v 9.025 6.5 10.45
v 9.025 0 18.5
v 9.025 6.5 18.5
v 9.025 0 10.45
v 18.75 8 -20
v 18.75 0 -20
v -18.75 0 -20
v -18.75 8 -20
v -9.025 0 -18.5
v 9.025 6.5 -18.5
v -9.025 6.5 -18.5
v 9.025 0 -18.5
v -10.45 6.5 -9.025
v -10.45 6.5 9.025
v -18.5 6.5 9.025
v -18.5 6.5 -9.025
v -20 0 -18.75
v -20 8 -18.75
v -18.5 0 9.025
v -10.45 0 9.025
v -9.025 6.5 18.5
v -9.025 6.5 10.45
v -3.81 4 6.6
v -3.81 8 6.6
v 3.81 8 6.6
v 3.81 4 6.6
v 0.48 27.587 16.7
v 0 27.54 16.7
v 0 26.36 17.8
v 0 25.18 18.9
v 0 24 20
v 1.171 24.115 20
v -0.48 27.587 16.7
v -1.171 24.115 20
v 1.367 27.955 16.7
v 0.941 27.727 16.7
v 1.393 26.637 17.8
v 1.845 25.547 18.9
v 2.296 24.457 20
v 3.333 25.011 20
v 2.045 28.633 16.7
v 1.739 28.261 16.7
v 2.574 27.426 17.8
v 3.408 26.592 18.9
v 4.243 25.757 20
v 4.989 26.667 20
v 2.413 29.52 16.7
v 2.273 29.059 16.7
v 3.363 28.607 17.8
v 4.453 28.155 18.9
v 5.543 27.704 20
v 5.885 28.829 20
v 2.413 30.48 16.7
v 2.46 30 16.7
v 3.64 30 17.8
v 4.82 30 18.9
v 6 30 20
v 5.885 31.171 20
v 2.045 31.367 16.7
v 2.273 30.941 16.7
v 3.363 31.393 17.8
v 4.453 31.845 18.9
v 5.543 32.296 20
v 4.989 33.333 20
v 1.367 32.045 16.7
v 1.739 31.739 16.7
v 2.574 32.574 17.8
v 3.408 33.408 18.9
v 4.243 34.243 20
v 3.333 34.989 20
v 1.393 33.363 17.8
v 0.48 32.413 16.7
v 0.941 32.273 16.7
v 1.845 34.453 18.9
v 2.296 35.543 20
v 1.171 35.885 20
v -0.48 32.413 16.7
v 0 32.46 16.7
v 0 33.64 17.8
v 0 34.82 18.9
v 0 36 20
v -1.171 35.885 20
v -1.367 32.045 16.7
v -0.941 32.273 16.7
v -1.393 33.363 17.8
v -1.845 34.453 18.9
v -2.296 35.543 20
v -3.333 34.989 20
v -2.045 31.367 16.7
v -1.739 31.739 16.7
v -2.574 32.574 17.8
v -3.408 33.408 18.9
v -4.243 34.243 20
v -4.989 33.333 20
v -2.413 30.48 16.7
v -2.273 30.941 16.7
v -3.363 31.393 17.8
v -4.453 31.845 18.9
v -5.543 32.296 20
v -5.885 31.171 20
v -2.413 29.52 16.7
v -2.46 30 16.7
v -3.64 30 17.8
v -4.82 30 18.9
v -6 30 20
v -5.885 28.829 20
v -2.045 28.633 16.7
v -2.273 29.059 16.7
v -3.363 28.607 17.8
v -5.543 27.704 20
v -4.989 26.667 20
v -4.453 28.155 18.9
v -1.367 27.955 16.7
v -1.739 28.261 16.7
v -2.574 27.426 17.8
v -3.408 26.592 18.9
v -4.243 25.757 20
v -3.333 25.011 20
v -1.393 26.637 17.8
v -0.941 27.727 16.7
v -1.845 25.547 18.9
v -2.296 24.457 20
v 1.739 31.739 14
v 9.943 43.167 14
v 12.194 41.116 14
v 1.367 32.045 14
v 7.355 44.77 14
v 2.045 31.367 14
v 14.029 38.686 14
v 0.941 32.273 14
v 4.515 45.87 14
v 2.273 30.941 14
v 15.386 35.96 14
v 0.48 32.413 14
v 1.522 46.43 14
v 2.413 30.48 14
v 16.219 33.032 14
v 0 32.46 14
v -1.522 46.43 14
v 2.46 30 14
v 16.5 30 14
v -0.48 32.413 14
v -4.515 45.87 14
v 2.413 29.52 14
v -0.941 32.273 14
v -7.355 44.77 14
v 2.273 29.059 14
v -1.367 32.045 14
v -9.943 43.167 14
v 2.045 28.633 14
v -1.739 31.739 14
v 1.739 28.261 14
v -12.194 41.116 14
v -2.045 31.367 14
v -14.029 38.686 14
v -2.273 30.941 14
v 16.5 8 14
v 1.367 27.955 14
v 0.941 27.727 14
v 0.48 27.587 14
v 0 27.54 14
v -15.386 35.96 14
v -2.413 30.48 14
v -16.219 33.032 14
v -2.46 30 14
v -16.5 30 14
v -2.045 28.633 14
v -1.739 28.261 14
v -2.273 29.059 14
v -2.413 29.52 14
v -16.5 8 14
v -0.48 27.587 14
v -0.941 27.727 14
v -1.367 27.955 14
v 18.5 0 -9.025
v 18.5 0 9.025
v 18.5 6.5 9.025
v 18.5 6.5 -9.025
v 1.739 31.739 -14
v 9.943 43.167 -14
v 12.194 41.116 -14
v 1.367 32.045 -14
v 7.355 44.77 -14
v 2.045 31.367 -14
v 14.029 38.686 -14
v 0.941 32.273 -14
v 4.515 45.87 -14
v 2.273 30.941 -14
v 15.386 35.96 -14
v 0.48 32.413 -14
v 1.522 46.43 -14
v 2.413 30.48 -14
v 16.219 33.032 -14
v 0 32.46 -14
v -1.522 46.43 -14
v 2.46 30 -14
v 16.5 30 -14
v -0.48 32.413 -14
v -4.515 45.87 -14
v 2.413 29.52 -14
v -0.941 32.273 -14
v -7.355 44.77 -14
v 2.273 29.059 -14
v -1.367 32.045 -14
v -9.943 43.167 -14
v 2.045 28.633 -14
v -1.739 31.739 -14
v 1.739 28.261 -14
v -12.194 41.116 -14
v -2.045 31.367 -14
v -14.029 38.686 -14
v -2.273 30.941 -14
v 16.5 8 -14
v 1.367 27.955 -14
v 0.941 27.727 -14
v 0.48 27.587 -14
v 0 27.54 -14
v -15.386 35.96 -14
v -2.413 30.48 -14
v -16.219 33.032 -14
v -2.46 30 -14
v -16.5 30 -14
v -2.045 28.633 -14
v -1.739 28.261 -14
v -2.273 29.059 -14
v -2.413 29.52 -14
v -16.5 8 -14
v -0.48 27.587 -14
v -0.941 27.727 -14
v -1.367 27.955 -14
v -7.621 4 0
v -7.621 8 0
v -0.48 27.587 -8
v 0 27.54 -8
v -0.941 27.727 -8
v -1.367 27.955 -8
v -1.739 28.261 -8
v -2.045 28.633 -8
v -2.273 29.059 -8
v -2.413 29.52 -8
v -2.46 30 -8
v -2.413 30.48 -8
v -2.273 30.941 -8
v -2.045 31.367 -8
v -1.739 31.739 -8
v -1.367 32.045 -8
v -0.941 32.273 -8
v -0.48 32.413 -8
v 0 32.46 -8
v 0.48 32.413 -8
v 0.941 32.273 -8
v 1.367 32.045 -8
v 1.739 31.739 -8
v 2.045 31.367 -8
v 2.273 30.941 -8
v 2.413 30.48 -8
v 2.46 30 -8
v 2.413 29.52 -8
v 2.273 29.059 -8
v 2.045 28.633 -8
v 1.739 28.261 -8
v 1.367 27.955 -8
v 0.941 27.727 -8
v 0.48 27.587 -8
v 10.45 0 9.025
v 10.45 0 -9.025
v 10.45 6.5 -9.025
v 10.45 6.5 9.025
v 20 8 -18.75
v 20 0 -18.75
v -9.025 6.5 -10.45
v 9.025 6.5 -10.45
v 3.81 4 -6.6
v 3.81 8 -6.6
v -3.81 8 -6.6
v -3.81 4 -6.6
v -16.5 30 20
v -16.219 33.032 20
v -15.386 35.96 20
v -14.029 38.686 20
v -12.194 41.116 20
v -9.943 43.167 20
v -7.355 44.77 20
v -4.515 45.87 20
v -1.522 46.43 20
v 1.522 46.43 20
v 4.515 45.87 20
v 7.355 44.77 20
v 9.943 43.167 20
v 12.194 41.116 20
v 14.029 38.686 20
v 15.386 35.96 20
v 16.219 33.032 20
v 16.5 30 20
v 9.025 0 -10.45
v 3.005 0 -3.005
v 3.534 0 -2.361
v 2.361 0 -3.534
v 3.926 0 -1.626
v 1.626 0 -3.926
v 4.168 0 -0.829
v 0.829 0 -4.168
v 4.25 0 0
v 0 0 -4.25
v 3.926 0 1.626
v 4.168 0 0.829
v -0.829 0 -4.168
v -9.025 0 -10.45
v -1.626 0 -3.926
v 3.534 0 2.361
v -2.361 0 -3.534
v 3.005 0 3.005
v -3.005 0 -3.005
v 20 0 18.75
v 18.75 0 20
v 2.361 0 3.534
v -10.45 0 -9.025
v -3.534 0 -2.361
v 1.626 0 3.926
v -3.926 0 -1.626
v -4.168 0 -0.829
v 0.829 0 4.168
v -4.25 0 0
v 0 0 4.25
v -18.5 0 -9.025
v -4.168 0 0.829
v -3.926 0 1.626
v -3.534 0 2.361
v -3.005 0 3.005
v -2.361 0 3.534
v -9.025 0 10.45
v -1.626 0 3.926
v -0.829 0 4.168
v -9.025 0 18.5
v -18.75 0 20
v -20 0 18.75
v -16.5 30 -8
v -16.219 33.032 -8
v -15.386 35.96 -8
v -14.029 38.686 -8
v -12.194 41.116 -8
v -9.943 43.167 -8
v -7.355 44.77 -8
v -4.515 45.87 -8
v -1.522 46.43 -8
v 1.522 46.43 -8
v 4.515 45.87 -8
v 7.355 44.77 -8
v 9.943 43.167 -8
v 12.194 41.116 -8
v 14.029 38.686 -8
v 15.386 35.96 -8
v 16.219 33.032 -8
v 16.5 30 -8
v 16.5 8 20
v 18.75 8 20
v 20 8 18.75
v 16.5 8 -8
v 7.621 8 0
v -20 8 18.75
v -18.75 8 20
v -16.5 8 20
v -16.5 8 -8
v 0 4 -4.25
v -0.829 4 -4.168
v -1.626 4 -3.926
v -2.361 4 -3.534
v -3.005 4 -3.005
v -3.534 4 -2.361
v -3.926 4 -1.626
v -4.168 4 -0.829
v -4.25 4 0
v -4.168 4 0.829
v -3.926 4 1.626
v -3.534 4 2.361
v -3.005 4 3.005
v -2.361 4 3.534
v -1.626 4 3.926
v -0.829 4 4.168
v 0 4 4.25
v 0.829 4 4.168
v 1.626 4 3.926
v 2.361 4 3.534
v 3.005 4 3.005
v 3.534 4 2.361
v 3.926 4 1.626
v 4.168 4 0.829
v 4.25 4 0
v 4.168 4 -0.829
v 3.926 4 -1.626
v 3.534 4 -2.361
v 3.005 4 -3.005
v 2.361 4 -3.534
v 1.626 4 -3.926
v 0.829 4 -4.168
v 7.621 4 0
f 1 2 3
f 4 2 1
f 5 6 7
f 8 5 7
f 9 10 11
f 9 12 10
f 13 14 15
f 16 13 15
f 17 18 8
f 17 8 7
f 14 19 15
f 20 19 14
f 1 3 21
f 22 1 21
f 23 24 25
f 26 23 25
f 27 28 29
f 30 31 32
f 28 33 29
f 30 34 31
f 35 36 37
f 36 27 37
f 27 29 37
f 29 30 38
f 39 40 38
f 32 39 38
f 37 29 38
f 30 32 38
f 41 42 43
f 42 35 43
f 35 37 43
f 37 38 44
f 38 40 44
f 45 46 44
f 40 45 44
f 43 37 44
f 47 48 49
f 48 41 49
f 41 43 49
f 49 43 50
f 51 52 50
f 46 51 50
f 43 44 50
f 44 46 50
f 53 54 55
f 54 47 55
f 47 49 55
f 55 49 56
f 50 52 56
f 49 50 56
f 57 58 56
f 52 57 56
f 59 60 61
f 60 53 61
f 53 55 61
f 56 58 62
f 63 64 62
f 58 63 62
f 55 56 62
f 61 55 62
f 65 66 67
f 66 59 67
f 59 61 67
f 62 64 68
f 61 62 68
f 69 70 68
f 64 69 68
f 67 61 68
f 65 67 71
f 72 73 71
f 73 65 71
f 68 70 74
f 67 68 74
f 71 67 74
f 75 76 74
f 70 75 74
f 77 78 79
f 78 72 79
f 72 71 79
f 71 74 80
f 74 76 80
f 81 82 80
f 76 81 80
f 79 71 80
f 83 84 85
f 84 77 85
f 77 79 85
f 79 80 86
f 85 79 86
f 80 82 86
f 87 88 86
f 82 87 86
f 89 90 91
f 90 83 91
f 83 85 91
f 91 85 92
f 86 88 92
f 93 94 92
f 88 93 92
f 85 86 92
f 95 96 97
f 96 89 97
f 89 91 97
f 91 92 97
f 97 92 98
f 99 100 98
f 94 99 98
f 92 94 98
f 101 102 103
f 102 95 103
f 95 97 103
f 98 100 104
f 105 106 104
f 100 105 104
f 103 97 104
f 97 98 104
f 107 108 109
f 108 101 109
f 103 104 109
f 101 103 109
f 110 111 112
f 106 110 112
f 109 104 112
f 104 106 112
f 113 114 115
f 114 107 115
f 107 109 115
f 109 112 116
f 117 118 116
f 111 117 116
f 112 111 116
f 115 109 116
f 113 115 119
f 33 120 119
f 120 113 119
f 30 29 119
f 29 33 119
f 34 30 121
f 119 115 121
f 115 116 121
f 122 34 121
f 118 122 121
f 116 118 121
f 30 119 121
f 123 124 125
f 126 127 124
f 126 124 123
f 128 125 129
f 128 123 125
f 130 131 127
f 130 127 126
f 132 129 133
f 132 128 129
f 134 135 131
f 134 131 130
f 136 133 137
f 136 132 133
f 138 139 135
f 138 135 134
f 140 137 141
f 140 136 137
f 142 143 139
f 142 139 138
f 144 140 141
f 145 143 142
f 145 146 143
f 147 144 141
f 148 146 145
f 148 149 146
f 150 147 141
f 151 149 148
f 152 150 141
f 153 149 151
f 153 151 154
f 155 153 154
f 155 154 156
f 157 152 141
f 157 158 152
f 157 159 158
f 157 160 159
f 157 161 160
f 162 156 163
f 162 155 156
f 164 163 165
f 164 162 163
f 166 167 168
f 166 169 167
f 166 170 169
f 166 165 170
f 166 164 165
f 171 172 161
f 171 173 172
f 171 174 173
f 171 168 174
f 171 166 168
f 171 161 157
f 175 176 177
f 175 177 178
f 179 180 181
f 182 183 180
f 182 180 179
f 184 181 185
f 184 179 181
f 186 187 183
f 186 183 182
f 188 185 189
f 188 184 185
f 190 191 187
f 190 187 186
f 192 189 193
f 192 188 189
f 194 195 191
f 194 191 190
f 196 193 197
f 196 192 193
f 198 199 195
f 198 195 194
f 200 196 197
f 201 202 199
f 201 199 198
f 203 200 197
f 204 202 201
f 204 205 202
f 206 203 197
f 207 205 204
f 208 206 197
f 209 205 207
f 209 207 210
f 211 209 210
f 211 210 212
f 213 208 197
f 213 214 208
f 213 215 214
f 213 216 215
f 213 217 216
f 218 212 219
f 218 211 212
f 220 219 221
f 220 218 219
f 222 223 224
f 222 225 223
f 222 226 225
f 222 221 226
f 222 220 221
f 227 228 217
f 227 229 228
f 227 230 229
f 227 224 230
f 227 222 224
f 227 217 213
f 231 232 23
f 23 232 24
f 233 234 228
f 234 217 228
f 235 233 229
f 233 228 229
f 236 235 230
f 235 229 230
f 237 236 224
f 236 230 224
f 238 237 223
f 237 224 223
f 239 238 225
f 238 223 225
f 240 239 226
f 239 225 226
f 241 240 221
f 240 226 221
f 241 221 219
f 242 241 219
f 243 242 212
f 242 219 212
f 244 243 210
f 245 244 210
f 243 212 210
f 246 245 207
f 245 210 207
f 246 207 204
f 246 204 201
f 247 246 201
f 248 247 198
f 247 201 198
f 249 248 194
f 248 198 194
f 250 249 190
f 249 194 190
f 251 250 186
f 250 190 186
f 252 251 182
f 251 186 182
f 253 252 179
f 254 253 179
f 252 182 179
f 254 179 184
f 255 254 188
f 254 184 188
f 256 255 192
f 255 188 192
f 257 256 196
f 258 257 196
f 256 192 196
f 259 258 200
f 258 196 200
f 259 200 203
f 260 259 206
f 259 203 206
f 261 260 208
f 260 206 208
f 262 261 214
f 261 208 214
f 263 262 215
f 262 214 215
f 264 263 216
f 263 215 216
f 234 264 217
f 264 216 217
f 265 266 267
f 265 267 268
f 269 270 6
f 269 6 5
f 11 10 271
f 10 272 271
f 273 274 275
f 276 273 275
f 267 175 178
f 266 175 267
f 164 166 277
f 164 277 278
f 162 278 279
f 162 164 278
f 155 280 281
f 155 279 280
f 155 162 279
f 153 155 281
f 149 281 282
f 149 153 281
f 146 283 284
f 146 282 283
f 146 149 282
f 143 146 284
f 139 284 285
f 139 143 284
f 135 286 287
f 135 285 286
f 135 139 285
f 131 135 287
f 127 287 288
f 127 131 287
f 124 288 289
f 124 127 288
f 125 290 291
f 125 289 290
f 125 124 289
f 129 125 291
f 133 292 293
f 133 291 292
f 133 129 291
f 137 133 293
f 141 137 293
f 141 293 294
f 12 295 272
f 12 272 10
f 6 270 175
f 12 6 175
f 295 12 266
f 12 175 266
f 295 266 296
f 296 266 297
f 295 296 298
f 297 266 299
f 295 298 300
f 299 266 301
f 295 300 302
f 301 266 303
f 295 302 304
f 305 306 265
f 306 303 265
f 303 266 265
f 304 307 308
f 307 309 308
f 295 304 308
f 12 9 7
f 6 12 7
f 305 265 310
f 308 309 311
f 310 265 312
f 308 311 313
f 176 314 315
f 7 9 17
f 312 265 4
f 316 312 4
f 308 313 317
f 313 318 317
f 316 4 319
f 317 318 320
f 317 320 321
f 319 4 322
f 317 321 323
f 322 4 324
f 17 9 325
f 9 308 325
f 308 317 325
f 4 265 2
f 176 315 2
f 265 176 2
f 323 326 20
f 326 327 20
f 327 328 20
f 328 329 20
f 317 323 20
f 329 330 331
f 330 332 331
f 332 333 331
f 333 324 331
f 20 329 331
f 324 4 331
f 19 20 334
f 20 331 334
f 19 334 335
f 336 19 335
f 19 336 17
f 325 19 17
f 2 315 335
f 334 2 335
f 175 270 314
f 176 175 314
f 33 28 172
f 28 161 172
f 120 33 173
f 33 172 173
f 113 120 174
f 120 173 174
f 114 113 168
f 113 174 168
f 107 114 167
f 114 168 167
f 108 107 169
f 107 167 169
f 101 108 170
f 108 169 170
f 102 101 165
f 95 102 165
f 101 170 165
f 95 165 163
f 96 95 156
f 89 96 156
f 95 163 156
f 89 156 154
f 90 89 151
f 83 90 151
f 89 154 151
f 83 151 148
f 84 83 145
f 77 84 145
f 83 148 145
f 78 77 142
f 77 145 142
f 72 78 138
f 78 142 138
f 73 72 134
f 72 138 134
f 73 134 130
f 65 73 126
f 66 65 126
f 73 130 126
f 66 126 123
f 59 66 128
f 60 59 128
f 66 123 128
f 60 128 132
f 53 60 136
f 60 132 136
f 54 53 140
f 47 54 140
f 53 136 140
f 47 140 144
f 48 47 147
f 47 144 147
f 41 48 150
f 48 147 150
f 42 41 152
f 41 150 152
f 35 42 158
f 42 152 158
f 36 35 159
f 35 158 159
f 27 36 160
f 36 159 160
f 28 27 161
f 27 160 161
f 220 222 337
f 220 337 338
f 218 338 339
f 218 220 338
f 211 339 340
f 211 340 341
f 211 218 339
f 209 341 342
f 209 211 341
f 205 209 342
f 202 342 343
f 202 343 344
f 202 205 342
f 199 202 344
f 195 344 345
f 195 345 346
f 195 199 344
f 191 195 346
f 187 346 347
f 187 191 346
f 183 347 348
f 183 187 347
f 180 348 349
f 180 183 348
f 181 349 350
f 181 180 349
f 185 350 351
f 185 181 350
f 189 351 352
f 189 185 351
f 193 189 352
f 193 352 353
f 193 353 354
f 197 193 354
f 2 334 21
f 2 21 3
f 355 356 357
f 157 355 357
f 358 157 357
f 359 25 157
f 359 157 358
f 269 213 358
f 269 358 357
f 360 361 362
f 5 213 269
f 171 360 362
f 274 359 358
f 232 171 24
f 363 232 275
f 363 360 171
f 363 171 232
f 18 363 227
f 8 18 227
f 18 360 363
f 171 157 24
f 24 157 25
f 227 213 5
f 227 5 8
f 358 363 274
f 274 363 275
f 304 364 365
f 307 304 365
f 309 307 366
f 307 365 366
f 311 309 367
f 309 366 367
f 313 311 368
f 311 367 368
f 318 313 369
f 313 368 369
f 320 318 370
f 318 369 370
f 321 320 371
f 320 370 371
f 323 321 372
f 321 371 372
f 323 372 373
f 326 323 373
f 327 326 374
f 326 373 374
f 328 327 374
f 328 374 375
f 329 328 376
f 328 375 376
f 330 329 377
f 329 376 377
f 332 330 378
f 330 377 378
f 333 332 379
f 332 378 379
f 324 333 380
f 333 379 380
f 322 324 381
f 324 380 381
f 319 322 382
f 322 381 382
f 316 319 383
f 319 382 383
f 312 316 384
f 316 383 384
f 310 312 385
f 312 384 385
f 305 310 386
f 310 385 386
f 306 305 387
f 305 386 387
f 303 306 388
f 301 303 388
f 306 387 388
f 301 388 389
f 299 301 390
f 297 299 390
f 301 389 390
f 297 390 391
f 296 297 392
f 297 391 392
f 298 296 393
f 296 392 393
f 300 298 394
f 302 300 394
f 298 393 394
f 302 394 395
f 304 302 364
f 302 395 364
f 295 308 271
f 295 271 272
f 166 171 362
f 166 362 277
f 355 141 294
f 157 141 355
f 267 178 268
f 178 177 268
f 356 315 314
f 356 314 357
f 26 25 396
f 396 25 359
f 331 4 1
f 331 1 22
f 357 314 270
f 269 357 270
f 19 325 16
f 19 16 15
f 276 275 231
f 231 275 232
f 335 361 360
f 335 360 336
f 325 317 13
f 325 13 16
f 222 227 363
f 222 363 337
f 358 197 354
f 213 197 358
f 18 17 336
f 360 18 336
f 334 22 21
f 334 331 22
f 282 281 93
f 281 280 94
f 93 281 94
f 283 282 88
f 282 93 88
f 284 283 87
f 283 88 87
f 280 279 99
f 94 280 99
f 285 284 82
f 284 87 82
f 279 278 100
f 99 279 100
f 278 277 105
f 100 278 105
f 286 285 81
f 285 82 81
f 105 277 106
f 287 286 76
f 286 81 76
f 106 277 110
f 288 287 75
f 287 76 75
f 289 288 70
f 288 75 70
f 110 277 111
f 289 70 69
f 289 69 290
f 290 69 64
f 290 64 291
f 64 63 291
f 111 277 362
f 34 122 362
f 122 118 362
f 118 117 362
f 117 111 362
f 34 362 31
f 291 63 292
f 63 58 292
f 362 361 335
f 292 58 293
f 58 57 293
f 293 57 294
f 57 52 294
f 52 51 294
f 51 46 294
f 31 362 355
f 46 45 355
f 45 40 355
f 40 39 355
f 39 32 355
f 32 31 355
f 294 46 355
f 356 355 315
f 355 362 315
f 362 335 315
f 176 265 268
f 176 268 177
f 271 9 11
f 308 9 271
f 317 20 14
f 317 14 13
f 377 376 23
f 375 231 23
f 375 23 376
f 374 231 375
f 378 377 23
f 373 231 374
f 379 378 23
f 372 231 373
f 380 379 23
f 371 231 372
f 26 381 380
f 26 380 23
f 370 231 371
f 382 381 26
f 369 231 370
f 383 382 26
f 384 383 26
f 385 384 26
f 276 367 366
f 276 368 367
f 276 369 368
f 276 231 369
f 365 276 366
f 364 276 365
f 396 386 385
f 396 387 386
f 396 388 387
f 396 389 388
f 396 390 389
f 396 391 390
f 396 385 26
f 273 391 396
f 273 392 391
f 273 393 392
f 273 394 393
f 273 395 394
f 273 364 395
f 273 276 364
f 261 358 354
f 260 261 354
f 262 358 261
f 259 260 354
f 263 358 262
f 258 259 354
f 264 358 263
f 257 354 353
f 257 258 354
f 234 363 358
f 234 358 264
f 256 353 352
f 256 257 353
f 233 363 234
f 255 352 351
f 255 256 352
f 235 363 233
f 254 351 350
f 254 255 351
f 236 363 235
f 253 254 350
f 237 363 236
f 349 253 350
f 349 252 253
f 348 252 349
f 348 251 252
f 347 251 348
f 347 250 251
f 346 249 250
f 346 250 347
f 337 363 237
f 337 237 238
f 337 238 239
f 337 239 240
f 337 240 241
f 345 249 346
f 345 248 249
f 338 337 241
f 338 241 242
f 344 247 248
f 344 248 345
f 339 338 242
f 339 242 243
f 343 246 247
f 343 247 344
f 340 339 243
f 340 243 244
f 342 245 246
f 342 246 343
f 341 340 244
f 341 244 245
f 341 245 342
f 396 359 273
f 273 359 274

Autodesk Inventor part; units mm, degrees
sketch "Skizze_1" plane through (0, 0, 0) normal (0, 1, 0) x (-1, 0, 0)
  line L0 (20, -20) -> (20, 20)
  line L1 (20, 20) -> (-20, 20)
  line L2 (-20, 20) -> (-20, -20)
  line L3 (-20, -20) -> (20, -20)
extrude "Extrusion1" add sketch "Skizze_1" along normal blind 52
sketch "Skizze_2" plane through (0, 0, 0) normal (1, 0, 0) x (0, 1, 0)
  line L0 (55, 20) -> (46.5, 20)
  line L1 (46.5, 20) -> (46.5, 14)
  line L2 (46.5, 14) -> (8, 14)
  line L3 (8, 14) -> (8, -8)
  line L4 (8, -8) -> (46.5, -8)
  line L5 (46.5, -8) -> (46.5, -14)
  line L6 (46.5, -14) -> (8, -14)
  line L7 (8, -14) -> (8, -20)
  line L8 (8, -20) -> (55, -20)
  line L9 (55, -20) -> (55, 20)
extrude "Extrusion2" cut sketch "Skizze_2" along normal mid plane 42
sketch "Skizze_3" plane through (0, 0, 0) normal (0, 0, 1) x (1, 0, 0)
  line L0 (-20, 53) -> (-20, 8)
  line L1 (-20, 8) -> (-16.5, 8)
  line L2 (-16.5, 8) -> (-16.5, 30)
  arc A0 (16.5, 30) -> (-16.5, 30) centre (0, 30) ccw
  line L3 (16.5, 30) -> (16.5, 8)
  line L4 (16.5, 8) -> (20, 8)
  line L5 (20, 8) -> (20, 53)
  line L6 (20, 53) -> (-20, 53)
extrude "Extrusion3" cut sketch "Skizze_3" along normal mid plane 42
sketch "Sketch4" plane through (-20, 0, 20) normal (0, 0, 1) x (1, 0, 0)
  point P0 (20, 30)
hole "Hole1" at (0, 30, 20) direction (0, 0, -1) diameter 4.92 depth 39.8 countersink diameter 12 countersink angle 94.019
sketch "Sketch_1" plane through (0, 0, 0) normal (0, 1, 0) x (-1, 0, 0)
  line L0 (9.025, -10.45) -> (-9.025, -10.45)
  line L1 (-9.025, -10.45) -> (-9.025, -18.5)
  line L2 (-9.025, -18.5) -> (9.025, -18.5)
  line L3 (9.025, -18.5) -> (9.025, -10.45)
extrude "Extrusion4" cut sketch "Sketch_1" along normal blind 6.5
sketch "Sketch_2" plane through (0, 0, 0) normal (0, 1, 0) x (-1, 0, 0)
  line L0 (9.025, 10.45) -> (9.025, 18.5)
  line L1 (9.025, 18.5) -> (-9.025, 18.5)
  line L2 (-9.025, 18.5) -> (-9.025, 10.45)
  line L3 (-9.025, 10.45) -> (9.025, 10.45)
extrude "Extrusion5" cut sketch "Sketch_2" along normal blind 6.5
sketch "Sketch_3" plane through (0, 0, 0) normal (0, 1, 0) x (-1, 0, 0)
  line L0 (-10.45, 9.025) -> (-18.5, 9.025)
  line L1 (-18.5, 9.025) -> (-18.5, -9.025)
  line L2 (-18.5, -9.025) -> (-10.45, -9.025)
  line L3 (-10.45, -9.025) -> (-10.45, 9.025)
extrude "Extrusion6" cut sketch "Sketch_3" along normal blind 6.5
sketch "Sketch_4" plane through (0, 0, 0) normal (0, 1, 0) x (-1, 0, 0)
  line L0 (18.5, 9.025) -> (10.45, 9.025)
  line L1 (10.45, 9.025) -> (10.45, -9.025)
  line L2 (10.45, -9.025) -> (18.5, -9.025)
  line L3 (18.5, -9.025) -> (18.5, 9.025)
extrude "Extrusion7" cut sketch "Sketch_4" along normal blind 6.5
sketch "Sketch9" plane through (0, 0, 0) normal (0, -1, 0) x (1, 0, 0)
  point P0 (0, 0)
hole "Hole2" at (0, 0, 0) direction (0, 1, 0) diameter 8.5 depth 8
sketch "Sketch_5" plane through (0, 8, 0) normal (0, 1, 0) x (1, 0, 0)
  line L0 (-7.621, 0) -> (-3.8105, -6.6)
  line L1 (-3.8105, -6.6) -> (3.8105, -6.6)
  line L2 (3.8105, -6.6) -> (7.621, 0)
  line L3 (7.621, 0) -> (3.8105, 6.6)
  line L4 (3.8105, 6.6) -> (-3.8105, 6.6)
  line L5 (-3.8105, 6.6) -> (-7.621, 0)
extrude "Extrusion8" cut sketch "Sketch_5" against normal blind 4
ref_plane "GN300Klemmhebel_XY" through (0, 29.8, 20) normal (0, 0, 1) x (1, 0, 0)
ref_plane "GN300Klemmhebel_YZ" through (0, 29.8, 20) normal (1, 0, 0) x (0, 1, 0)
ref_plane "GN300Klemmhebel_ZX" through (0, 29.8, 20) normal (0, 1, 0) x (0, 0, 1)
ref_plane "GUS_4_41_XY" through (0, 29.8, 0) normal (0, 0, 1) x (1, 0, 0)
ref_plane "GUS_4_41_YZ" through (0, 29.8, 0) normal (1, 0, 0) x (0, 1, 0)
ref_plane "GUS_4_41_ZX" through (0, 29.8, 0) normal (0, 1, 0) x (0, 0, 1)
ref_plane "GUS_4_41_L_XY" through (0, 29.8, -20) normal (0, 0, 1) x (1, 0, 0)
ref_plane "GUS_4_41_L_YZ" through (0, 29.8, -20) normal (1, 0, 0) x (0, 1, 0)
ref_plane "GUS_4_41_L_ZX" through (0, 29.8, -20) normal (0, 1, 0) x (0, 0, 1)
ref_plane "GUS_4_41_R_XY" through (0, 29.8, 20) normal (0, 0, 1) x (1, 0, 0)
ref_plane "GUS_4_41_R_YZ" through (0, 29.8, 20) normal (1, 0, 0) x (0, 1, 0)
ref_plane "GUS_4_41_R_ZX" through (0, 29.8, 20) normal (0, 1, 0) x (0, 0, 1)
ref_plane "p0_XY" through (0, 0, 0) normal (0, 1, 0) x (1, 0, 0)
ref_plane "p0_YZ" through (0, 0, 0) normal (1, 0, 0) x (0, 0, -1)
ref_plane "p0_ZX" through (0, 0, 0) normal (0, 0, -1) x (0, 1, 0)
ref_plane "p1_XY" through (0, 0, -14.475) normal (0, 1, 0) x (1, 0, 0)
ref_plane "p1_YZ" through (0, 0, -14.475) normal (1, 0, 0) x (0, 0, -1)
ref_plane "p1_ZX" through (0, 0, -14.475) normal (0, 0, -1) x (0, 1, 0)
ref_plane "p2_XY" through (14.475, 0, 0) normal (0, 1, 0) x (1, 0, 0)
ref_plane "p2_YZ" through (14.475, 0, 0) normal (1, 0, 0) x (0, 0, -1)
ref_plane "p2_ZX" through (14.475, 0, 0) normal (0, 0, -1) x (0, 1, 0)
ref_plane "p3_XY" through (0, 0, 14.475) normal (0, 1, 0) x (1, 0, 0)
ref_plane "p3_YZ" through (0, 0, 14.475) normal (1, 0, 0) x (0, 0, -1)
ref_plane "p3_ZX" through (0, 0, 14.475) normal (0, 0, -1) x (0, 1, 0)
ref_plane "p4_XY" through (-14.475, 0, 0) normal (0, 1, 0) x (1, 0, 0)
ref_plane "p4_YZ" through (-14.475, 0, 0) normal (1, 0, 0) x (0, 0, -1)
ref_plane "p4_ZX" through (-14.475, 0, 0) normal (0, 0, -1) x (0, 1, 0)
ref_plane "ps_XY" through (0, 8, 0) normal (0, 1, 0) x (1, 0, 0)
ref_plane "ps_YZ" through (0, 8, 0) normal (1, 0, 0) x (0, 0, -1)
ref_plane "ps_ZX" through (0, 8, 0) normal (0, 0, -1) x (0, 1, 0)
chamfer "Chamfer1" distance 1.25 angle 45 4 edges at (-20, 4, -20) (-20, 4, 20) (20, 4, 20) (20, 4, -20)
properties part number "Robotunits GUS_4040 -90"
